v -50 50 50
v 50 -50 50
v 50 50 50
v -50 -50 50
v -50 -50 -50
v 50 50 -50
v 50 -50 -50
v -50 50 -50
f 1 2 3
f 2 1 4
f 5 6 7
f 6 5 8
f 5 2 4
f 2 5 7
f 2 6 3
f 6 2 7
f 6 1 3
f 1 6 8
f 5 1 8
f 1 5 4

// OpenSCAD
// Source geometry in millimetres; export mesh coordinates in metres.
cube([100, 100, 100], center=true);
